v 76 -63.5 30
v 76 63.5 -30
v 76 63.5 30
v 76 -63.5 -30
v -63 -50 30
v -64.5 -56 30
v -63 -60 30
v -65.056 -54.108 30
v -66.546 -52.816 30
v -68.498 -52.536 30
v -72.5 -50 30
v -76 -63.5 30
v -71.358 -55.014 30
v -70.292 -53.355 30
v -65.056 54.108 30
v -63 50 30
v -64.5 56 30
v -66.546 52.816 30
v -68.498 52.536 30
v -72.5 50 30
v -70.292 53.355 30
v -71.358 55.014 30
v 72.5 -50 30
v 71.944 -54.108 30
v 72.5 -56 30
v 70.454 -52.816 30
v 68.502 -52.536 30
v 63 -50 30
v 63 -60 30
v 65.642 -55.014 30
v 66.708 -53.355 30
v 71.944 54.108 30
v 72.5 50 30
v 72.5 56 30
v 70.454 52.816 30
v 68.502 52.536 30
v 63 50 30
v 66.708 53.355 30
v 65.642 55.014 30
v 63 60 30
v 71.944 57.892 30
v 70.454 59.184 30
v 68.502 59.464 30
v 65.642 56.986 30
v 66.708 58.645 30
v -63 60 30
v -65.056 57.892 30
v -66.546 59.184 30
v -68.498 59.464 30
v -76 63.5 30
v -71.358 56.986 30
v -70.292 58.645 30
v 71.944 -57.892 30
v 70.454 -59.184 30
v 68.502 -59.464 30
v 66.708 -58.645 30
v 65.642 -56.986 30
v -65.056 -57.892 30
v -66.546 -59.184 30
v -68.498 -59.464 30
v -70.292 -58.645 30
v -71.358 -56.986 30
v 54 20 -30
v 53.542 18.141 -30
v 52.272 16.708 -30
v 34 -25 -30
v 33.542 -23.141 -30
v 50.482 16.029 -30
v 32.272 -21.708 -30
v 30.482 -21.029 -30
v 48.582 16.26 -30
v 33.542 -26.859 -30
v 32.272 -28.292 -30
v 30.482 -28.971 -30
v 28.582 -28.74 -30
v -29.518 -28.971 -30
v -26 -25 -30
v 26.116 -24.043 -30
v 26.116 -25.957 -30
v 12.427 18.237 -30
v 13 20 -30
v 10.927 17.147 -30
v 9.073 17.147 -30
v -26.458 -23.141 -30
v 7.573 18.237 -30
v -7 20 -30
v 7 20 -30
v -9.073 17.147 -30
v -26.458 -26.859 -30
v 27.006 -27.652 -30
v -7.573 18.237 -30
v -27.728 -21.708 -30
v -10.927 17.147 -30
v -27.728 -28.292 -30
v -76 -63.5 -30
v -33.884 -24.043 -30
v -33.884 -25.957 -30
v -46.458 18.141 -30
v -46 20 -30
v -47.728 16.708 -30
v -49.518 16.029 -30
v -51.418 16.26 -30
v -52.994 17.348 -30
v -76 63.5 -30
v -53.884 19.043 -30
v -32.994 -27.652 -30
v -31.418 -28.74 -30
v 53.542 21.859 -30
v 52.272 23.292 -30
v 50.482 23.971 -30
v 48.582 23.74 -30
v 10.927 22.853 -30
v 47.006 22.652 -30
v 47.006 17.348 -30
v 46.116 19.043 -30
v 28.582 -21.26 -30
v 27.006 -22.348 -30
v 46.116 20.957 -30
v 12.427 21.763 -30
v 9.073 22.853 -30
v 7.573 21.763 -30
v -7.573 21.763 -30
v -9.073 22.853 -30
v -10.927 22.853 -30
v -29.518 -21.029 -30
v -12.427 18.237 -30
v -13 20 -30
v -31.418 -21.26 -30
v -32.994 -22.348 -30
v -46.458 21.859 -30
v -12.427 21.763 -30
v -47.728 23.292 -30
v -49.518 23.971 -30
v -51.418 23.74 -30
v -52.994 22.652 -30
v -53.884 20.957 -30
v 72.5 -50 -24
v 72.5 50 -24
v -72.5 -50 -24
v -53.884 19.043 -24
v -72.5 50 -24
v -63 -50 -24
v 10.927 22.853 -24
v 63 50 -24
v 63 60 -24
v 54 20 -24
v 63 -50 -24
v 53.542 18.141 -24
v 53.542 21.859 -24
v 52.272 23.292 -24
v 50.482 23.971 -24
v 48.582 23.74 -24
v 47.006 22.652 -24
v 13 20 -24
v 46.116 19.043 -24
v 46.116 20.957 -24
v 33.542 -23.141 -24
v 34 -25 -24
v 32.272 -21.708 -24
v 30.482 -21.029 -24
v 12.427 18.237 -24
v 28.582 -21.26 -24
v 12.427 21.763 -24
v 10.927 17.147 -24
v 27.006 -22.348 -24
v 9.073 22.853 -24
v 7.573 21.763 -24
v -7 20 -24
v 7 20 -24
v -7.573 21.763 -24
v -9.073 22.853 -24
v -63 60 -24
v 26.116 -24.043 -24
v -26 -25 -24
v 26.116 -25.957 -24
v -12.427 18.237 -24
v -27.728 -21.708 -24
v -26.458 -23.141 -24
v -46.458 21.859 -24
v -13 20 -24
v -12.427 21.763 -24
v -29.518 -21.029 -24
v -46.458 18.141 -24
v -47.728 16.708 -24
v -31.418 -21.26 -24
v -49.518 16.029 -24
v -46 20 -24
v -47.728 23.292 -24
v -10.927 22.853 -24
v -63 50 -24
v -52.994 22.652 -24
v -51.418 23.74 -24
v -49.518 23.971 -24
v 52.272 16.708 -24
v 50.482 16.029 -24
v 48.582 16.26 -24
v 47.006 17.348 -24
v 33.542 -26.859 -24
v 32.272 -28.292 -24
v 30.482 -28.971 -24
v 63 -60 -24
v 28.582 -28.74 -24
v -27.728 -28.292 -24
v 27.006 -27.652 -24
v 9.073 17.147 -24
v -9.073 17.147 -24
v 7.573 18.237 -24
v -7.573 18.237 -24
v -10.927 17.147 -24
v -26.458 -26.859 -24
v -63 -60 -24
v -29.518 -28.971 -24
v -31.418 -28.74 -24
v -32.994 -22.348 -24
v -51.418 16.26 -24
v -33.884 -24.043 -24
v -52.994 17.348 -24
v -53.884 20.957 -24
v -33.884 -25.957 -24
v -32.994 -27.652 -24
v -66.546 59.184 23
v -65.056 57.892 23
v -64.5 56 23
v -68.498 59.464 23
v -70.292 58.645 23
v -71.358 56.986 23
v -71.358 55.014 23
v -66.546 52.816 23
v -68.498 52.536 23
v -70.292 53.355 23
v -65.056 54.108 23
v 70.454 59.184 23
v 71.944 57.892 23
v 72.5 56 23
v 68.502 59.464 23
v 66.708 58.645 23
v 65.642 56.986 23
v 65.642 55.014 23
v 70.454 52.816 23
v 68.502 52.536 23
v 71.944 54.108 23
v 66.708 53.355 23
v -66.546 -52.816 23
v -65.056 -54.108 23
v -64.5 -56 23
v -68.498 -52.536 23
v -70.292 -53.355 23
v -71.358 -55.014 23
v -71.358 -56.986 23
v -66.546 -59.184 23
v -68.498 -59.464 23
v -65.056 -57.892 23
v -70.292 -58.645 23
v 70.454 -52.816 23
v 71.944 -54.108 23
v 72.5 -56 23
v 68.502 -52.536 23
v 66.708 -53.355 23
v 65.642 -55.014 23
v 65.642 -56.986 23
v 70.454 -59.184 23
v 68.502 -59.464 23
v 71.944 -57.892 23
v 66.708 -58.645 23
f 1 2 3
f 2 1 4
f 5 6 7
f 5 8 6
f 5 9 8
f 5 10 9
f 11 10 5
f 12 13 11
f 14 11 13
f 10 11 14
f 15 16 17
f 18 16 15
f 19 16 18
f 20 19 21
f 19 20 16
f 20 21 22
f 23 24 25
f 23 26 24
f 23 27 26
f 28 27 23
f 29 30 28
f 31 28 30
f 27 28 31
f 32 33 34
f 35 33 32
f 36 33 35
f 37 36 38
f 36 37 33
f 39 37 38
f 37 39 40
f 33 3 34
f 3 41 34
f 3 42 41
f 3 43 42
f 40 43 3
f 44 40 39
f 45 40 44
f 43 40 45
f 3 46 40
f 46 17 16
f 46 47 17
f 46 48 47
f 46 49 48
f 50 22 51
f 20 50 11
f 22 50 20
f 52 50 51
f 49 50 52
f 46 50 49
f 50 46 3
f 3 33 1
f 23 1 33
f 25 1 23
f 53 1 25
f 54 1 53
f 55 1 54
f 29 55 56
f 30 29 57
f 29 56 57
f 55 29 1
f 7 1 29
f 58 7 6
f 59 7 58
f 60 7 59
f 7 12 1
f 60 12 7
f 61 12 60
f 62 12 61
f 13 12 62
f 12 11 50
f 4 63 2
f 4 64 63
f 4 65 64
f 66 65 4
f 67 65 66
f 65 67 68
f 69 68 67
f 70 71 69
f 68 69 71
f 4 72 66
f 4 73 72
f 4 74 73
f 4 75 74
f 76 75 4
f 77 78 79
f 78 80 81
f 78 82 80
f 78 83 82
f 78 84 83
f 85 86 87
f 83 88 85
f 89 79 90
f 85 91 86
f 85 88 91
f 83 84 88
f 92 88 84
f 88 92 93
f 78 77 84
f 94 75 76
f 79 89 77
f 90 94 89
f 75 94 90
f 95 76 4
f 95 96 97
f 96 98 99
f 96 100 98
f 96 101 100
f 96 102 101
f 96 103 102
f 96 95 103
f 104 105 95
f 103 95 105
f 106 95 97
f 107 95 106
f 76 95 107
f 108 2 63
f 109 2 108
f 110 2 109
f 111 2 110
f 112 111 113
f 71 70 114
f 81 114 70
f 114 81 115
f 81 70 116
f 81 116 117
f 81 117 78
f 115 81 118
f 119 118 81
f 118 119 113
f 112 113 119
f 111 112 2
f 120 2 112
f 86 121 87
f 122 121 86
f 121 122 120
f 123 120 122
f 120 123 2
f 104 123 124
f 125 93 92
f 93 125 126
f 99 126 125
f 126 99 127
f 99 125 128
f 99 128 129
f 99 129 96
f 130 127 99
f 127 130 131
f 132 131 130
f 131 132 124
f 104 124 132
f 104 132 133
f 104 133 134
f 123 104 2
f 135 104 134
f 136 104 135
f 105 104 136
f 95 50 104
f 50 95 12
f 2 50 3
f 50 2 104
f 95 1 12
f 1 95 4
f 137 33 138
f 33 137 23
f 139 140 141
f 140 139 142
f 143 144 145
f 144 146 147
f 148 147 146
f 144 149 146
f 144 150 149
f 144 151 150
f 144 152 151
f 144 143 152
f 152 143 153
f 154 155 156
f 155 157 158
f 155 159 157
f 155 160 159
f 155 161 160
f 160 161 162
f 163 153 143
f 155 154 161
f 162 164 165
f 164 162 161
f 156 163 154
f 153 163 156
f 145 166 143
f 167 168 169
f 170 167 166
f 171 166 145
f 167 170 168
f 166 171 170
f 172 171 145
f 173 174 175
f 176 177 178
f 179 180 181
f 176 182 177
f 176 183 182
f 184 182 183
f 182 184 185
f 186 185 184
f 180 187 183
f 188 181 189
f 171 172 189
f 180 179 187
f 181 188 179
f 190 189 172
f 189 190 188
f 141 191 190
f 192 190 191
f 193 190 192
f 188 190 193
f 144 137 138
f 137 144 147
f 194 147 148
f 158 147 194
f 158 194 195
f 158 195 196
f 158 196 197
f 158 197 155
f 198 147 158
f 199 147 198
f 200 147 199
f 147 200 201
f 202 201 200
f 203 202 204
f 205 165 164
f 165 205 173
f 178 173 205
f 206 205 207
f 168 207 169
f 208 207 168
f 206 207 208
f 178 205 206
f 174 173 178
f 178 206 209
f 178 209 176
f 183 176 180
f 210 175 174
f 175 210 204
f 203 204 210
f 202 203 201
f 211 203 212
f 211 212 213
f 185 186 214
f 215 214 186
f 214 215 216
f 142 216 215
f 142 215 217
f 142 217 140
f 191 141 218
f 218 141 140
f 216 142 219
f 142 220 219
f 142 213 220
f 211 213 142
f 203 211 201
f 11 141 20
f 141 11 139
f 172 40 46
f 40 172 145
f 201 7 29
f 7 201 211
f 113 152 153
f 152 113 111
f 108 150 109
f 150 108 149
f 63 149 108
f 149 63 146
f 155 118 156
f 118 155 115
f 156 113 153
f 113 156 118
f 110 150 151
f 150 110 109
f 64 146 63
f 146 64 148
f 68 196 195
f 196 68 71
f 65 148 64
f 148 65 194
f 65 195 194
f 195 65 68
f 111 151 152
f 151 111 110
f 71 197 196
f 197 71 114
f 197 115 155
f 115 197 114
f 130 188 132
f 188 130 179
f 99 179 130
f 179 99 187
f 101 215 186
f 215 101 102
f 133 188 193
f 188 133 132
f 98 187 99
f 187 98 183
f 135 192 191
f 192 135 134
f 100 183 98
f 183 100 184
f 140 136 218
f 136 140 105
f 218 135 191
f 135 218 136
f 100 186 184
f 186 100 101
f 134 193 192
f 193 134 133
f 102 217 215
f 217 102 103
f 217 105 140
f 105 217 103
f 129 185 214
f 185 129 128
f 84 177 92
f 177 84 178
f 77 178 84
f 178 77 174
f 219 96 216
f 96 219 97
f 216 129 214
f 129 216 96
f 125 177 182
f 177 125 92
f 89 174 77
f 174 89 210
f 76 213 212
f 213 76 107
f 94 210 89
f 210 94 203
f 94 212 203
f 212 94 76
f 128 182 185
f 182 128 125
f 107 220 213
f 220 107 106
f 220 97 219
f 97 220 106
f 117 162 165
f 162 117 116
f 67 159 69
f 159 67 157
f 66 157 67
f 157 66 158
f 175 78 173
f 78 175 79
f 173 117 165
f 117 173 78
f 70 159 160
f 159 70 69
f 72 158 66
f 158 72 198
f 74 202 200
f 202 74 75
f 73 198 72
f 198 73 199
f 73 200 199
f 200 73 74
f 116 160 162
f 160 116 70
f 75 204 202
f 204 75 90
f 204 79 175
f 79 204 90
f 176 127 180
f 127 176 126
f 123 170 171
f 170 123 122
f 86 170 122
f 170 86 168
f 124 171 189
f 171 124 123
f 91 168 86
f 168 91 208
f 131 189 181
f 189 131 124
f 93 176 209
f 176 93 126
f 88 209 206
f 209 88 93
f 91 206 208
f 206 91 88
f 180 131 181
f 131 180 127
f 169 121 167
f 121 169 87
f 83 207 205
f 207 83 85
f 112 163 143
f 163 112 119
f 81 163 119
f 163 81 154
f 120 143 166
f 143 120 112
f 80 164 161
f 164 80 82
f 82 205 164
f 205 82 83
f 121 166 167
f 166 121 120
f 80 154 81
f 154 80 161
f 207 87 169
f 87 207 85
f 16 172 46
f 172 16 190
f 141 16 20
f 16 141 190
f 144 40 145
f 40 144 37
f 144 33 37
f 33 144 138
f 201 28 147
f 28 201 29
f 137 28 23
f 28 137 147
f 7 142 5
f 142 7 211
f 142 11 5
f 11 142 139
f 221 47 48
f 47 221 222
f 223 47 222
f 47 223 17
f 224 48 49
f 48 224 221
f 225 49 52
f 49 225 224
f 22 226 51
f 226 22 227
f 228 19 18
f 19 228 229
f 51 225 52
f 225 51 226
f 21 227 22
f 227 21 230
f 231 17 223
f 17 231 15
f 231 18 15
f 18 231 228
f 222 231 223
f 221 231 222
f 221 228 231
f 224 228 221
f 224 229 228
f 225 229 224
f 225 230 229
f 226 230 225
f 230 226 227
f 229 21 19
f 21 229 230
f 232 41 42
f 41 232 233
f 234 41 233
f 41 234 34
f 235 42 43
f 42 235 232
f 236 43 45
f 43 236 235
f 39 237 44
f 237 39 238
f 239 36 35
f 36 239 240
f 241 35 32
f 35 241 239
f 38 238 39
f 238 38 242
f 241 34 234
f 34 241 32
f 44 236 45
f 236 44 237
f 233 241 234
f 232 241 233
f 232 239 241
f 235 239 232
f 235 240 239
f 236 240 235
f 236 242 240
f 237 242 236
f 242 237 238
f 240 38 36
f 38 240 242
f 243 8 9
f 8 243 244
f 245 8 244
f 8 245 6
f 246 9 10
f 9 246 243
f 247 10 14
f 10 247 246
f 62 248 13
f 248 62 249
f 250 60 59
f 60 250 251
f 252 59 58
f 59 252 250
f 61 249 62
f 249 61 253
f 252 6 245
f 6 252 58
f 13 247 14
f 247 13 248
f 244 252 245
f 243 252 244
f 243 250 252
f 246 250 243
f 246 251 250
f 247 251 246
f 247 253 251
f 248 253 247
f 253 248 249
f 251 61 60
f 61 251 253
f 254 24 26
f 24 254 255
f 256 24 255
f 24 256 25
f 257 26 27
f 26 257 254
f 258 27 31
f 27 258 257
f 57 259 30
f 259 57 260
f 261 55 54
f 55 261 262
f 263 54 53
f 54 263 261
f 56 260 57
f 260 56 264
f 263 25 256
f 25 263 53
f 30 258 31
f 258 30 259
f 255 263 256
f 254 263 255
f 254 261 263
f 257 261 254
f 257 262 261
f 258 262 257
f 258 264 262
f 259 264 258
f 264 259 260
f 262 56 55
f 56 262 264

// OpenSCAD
bLength = 152;
bWidth = 127;
bHeight = 60;

potHoles = 4;
qHole = 3;

sHole = 3;
ledHole = 3;

supCubeWidth = 10;
supCubeHeight = 55;
supHoles = 3.5;
supHolesHeight = 15;



union(){

difference(){
difference(){
cube([bLength,bWidth,bHeight],center = true);
translate([0,0,6])cube([bLength-7,bWidth-7,bHeight],center = true);
}

translate([50,bHeight/3,-40]) cylinder(20,potHoles,potHoles);
translate([-50,bHeight/3,-40]) cylinder(20,potHoles,potHoles);
translate([-30,-25,-40]) cylinder(20,potHoles,potHoles);
translate([30,-25,-40]) cylinder(20,potHoles,potHoles);
//translate([50,-50,-40]) cylinder(20,qHole,qHole);
translate([-10,20,-40]) cylinder(20,sHole,sHole);
translate([10,20,-40]) cylinder(20,ledHole,ledHole);
}



difference(){

union(){
translate([-73,50,-25])cube([supCubeWidth,supCubeWidth,supCubeHeight]);
translate([63,50,-25])cube([supCubeWidth,supCubeWidth,supCubeHeight]);
translate([63,-60,-25])cube([supCubeWidth,supCubeWidth,supCubeHeight]);
translate([-73,-60,-25])cube([supCubeWidth,supCubeWidth,supCubeHeight]);

}

union(){
translate([-68,56,23])cylinder(supHolesHeight,supHoles,supHoles);
translate([69,56,23])cylinder(supHolesHeight,supHoles,supHoles);
translate([-68,-56,23])cylinder(supHolesHeight,supHoles,supHoles);
translate([69,-56,23])cylinder(supHolesHeight,supHoles,supHoles);
}



}

}
